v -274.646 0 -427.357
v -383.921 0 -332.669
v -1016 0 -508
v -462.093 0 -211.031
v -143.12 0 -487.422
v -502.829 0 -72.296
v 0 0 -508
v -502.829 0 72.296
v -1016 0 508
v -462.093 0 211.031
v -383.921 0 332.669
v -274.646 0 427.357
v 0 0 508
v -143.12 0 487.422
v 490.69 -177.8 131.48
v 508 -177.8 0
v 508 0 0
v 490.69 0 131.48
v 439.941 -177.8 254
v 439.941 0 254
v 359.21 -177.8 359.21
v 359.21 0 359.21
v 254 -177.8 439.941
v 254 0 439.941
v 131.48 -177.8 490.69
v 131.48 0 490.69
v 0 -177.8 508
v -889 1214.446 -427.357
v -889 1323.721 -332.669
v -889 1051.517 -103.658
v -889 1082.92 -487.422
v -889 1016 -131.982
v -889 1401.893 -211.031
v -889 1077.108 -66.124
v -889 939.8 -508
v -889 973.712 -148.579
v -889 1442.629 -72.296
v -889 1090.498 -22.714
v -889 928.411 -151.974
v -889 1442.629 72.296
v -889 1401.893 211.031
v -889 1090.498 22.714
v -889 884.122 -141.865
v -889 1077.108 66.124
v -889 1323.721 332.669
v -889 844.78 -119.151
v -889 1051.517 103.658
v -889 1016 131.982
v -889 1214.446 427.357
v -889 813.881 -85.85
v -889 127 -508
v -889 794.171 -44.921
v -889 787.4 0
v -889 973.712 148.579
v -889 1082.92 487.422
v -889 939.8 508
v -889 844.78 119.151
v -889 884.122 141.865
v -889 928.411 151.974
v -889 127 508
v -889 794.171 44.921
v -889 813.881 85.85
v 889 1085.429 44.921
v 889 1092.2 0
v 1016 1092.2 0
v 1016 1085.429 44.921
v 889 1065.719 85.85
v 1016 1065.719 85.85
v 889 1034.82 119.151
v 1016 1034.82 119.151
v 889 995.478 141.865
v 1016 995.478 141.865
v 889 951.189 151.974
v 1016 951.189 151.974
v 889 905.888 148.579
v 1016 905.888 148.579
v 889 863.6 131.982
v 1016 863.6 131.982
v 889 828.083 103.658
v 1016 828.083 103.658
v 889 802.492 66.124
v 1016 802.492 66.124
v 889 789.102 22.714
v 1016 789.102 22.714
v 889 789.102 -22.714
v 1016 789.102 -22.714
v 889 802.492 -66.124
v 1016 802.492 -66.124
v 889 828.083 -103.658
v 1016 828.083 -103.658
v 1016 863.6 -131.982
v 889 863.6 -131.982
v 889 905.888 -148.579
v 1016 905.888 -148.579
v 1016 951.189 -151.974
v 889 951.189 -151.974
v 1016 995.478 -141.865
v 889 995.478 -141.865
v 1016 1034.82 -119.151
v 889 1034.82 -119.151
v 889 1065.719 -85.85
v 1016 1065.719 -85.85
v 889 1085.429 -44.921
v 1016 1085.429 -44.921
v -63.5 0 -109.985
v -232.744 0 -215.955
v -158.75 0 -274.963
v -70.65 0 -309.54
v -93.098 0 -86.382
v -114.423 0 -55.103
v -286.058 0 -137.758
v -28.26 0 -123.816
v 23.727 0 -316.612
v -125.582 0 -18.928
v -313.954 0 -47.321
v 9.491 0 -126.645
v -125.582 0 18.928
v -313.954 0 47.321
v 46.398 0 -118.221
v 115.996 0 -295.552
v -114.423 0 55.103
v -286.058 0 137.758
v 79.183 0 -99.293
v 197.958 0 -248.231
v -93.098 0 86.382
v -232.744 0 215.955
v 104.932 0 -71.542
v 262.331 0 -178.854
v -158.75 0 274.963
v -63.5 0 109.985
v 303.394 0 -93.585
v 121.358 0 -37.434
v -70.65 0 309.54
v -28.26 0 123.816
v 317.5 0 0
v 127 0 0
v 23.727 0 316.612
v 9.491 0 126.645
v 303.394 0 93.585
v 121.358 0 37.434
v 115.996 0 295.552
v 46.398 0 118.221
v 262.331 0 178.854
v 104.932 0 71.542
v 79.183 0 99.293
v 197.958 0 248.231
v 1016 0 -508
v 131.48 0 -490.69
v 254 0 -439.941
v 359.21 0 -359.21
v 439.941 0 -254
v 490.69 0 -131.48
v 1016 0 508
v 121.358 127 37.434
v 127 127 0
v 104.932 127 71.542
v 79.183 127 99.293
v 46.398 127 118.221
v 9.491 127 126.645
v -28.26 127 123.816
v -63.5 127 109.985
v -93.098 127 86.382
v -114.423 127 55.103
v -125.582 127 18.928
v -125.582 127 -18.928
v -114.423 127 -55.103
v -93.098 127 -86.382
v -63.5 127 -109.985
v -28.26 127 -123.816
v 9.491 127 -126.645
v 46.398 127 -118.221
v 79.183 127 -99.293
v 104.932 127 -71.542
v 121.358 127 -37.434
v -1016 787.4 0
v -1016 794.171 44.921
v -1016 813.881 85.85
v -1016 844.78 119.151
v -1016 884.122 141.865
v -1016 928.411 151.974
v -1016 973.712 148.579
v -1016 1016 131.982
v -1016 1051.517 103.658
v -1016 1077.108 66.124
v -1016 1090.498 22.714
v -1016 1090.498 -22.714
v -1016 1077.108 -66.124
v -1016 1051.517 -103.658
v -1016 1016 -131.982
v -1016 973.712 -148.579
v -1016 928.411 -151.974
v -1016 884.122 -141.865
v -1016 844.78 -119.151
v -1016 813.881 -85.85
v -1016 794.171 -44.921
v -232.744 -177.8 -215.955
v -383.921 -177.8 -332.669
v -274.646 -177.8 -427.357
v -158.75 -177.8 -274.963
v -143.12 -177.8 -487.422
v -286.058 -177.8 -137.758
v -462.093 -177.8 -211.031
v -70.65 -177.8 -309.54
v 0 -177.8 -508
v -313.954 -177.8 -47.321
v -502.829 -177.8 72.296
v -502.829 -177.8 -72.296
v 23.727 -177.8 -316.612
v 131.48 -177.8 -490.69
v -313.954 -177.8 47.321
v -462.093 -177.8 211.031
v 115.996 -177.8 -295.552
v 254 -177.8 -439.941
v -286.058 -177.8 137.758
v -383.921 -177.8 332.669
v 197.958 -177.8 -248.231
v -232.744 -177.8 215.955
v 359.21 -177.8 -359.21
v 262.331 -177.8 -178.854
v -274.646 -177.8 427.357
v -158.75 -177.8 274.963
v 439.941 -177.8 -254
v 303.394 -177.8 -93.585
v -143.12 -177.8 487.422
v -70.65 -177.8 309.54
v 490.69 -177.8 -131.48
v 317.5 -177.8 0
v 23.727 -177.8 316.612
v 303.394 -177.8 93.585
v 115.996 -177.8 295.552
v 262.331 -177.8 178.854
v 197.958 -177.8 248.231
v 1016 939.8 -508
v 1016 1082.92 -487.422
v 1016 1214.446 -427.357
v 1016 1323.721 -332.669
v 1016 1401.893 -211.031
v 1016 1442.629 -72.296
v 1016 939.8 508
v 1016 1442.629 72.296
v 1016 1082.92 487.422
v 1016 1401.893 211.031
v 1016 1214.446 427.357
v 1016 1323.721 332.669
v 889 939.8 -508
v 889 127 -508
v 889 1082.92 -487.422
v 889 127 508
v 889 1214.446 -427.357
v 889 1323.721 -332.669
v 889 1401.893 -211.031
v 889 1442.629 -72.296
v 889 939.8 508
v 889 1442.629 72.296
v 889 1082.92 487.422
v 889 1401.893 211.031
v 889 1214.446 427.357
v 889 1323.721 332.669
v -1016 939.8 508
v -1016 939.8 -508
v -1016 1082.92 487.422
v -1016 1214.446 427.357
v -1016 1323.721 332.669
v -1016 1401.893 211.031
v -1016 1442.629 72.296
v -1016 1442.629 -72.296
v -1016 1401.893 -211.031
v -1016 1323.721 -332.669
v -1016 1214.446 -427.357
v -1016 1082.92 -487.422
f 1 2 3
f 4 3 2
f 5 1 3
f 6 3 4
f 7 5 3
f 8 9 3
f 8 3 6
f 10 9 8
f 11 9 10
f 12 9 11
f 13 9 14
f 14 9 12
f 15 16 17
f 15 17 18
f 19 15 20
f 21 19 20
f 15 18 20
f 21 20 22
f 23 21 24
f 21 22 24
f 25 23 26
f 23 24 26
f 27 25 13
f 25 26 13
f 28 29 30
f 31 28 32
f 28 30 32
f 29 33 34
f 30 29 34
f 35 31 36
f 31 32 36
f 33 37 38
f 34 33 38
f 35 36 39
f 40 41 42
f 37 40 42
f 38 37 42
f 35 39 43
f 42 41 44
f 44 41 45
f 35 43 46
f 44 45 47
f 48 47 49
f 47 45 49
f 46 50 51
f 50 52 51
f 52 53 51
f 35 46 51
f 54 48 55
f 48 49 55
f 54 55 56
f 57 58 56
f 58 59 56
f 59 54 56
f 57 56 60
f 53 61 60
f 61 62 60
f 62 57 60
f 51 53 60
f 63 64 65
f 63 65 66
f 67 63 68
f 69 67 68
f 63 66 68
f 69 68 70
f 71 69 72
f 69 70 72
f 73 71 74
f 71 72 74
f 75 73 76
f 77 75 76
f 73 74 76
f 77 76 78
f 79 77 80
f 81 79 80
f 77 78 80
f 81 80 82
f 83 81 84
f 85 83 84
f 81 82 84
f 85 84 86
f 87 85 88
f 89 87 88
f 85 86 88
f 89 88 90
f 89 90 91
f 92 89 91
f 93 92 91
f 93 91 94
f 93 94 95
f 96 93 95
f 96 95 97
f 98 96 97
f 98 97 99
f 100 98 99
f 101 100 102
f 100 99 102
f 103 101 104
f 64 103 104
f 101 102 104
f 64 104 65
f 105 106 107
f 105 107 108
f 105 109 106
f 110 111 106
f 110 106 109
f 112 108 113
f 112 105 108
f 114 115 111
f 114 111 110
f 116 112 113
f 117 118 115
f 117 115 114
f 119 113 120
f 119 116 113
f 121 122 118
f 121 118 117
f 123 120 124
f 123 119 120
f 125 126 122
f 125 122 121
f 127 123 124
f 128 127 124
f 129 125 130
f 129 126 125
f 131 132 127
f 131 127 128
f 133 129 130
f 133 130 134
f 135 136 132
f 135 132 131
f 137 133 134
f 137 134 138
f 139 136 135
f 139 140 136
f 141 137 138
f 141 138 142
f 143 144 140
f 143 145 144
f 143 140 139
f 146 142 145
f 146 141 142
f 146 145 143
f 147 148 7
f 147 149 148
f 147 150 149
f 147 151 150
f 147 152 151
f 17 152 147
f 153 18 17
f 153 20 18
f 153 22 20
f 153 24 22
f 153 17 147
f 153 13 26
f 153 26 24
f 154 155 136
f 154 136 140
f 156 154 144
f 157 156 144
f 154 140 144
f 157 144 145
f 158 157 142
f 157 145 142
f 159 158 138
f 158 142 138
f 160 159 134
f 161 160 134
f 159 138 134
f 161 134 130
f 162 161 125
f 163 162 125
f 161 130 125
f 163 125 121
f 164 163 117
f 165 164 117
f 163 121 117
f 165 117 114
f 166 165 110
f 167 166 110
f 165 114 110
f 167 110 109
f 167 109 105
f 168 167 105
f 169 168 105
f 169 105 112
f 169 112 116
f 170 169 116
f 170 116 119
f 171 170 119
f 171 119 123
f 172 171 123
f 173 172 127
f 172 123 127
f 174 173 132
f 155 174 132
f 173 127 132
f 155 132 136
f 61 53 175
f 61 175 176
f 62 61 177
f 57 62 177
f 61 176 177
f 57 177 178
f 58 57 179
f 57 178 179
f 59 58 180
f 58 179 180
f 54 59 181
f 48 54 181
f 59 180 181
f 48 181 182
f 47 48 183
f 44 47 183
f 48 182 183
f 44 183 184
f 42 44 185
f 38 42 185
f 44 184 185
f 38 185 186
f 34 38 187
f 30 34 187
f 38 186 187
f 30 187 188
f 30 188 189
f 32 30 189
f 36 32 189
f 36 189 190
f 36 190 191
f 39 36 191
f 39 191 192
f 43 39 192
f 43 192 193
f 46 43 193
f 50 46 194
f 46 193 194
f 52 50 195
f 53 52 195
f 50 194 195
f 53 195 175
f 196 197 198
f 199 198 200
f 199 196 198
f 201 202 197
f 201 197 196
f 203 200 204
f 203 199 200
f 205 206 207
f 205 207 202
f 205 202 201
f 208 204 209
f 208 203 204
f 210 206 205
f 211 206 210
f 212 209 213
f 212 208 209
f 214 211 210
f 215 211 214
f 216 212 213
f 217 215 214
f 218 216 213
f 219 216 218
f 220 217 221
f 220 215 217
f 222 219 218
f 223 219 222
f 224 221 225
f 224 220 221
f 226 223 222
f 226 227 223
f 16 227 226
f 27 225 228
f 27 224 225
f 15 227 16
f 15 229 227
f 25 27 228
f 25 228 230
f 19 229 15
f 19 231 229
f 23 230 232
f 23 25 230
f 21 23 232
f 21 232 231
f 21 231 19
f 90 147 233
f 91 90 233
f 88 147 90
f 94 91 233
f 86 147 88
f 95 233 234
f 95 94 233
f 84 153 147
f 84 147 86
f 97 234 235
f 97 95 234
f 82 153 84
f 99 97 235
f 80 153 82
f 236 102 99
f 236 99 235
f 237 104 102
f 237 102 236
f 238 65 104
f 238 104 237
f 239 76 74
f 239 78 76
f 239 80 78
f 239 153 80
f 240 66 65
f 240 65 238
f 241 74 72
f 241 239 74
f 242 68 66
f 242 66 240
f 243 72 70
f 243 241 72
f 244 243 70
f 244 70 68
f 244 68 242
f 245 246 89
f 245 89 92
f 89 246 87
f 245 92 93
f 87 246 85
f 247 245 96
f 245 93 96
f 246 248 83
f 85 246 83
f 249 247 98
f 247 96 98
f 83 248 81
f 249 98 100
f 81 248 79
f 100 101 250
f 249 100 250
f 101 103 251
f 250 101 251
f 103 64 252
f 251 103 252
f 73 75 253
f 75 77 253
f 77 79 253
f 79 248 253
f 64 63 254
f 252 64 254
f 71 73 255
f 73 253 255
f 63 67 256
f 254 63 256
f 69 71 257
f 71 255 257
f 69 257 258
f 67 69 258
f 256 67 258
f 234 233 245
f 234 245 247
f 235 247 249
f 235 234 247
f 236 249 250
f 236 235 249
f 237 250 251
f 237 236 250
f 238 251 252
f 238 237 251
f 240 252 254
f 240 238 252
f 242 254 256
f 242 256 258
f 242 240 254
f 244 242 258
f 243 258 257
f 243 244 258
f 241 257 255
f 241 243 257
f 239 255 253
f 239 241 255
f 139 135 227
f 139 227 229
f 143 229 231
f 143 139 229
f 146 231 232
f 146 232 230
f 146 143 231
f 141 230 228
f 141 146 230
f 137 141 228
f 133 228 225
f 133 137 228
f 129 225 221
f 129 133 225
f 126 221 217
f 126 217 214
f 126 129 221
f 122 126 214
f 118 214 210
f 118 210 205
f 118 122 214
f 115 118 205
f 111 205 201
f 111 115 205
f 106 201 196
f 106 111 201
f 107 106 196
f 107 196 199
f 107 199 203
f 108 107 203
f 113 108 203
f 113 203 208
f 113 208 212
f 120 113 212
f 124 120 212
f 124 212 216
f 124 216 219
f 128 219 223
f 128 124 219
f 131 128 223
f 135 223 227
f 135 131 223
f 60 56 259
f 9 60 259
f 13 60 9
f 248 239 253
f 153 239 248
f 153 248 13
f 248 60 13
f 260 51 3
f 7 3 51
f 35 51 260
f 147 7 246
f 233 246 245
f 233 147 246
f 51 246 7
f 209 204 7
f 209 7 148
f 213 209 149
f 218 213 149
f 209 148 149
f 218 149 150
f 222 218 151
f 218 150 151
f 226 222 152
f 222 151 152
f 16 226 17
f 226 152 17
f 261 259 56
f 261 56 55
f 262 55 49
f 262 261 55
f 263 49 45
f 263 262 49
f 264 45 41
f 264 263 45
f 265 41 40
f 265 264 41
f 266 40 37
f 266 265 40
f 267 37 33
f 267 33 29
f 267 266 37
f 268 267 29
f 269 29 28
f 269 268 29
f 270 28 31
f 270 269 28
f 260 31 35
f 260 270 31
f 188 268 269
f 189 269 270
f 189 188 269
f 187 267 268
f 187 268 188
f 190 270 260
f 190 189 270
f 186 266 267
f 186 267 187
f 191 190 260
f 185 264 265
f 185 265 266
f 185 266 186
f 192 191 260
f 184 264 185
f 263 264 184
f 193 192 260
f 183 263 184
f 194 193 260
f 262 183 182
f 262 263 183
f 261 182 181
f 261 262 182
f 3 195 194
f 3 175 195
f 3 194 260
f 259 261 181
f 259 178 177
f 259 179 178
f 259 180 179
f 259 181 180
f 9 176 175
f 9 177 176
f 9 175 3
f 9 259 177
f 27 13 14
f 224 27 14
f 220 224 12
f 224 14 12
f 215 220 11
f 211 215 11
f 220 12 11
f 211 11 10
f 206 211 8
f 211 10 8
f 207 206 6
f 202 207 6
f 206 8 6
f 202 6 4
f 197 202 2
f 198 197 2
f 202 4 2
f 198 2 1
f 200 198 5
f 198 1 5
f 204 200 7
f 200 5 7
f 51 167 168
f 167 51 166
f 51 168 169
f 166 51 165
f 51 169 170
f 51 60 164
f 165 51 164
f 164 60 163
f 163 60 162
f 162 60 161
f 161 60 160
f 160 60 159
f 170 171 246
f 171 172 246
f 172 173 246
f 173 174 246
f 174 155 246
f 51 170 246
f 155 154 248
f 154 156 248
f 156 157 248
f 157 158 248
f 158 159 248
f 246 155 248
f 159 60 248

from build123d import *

# Parameters (mm, degrees)
F0_R     = 317.5
F1_DEPTH = 127
F2_DEPTH = 177.8
F0_R_2   = 127
F3_DEPTH = 127
F4_R     = 152.4
F5_DEPTH = 127
F6_R     = 152.4
F7_DEPTH = 127


with BuildPart() as f1:
    # F0 (on Front) → F1 (new body)
    with BuildSketch(Plane.XZ):
        with BuildLine():
            ThreePointArc((2e-06, 508), (359.210245, 359.210244), (508, 0))
            ThreePointArc((508, 0), (359.210245, -359.210244), (2e-06, -508))
            Line((2e-06, -508), (1016, -508))
            Line((1016, -508), (1016, 508))
            Line((1016, 508), (2e-06, 508))
        make_face()
        with BuildLine():
            ThreePointArc((2e-06, -508), (-508, 0), (2e-06, 508))
            Line((2e-06, 508), (-1016, 508))
            Line((-1016, 508), (-1016, -508))
            Line((-1016, -508), (2e-06, -508))
        make_face()
        with BuildLine():
            ThreePointArc((2e-06, -508), (359.210245, -359.210244), (508, 0))
            ThreePointArc((508, 0), (359.210245, 359.210244), (2e-06, 508))
            ThreePointArc((2e-06, 508), (-508, 0), (2e-06, -508))
        make_face()
        Circle(F0_R, mode=Mode.SUBTRACT)
    extrude(amount=-F1_DEPTH)

    # F0 (on Front) → F2 (join)
    with BuildSketch(Plane.XZ):
        with BuildLine():
            ThreePointArc((2e-06, -508), (359.210245, -359.210244), (508, 0))
            ThreePointArc((508, 0), (359.210245, 359.210244), (2e-06, 508))
            ThreePointArc((2e-06, 508), (-508, 0), (2e-06, -508))
        make_face()
        Circle(F0_R, mode=Mode.SUBTRACT)
    extrude(amount=F2_DEPTH)

    # F0 (on Front) → F3 (join)
    with BuildSketch(Plane.XZ):
        Circle(F0_R)
        Circle(F0_R_2, mode=Mode.SUBTRACT)
    extrude(amount=-F3_DEPTH)

    # F4 (on face) → F5 (join)
    with BuildSketch(Plane(origin=(-1016, 0, 0), x_dir=(0, -1, 0), z_dir=(-1, 0, 0))):
        with BuildLine():
            Line((-127, -508), (-127, 508))
            Line((-127, 508), (-939.8, 508))
            ThreePointArc((-939.8, 508), (-1447.8, 0), (-939.8, -508))
            Line((-939.8, -508), (-127, -508))
        make_face()
        with Locations((-939.8, 0)):
            Circle(F4_R, mode=Mode.SUBTRACT)
    extrude(amount=-F5_DEPTH)

    # F6 (on face) → F7 (join)
    with BuildSketch(Plane.YZ.offset(1016)):
        with BuildLine():
            Line((127, 508), (127, -508))
            Line((127, -508), (939.8, -508))
            ThreePointArc((939.8, -508), (1447.8, 0), (939.8, 508))
            Line((939.8, 508), (127, 508))
        make_face()
        with Locations((939.8, 0)):
            Circle(F6_R, mode=Mode.SUBTRACT)
    extrude(amount=-F7_DEPTH)


solid = f1.part
